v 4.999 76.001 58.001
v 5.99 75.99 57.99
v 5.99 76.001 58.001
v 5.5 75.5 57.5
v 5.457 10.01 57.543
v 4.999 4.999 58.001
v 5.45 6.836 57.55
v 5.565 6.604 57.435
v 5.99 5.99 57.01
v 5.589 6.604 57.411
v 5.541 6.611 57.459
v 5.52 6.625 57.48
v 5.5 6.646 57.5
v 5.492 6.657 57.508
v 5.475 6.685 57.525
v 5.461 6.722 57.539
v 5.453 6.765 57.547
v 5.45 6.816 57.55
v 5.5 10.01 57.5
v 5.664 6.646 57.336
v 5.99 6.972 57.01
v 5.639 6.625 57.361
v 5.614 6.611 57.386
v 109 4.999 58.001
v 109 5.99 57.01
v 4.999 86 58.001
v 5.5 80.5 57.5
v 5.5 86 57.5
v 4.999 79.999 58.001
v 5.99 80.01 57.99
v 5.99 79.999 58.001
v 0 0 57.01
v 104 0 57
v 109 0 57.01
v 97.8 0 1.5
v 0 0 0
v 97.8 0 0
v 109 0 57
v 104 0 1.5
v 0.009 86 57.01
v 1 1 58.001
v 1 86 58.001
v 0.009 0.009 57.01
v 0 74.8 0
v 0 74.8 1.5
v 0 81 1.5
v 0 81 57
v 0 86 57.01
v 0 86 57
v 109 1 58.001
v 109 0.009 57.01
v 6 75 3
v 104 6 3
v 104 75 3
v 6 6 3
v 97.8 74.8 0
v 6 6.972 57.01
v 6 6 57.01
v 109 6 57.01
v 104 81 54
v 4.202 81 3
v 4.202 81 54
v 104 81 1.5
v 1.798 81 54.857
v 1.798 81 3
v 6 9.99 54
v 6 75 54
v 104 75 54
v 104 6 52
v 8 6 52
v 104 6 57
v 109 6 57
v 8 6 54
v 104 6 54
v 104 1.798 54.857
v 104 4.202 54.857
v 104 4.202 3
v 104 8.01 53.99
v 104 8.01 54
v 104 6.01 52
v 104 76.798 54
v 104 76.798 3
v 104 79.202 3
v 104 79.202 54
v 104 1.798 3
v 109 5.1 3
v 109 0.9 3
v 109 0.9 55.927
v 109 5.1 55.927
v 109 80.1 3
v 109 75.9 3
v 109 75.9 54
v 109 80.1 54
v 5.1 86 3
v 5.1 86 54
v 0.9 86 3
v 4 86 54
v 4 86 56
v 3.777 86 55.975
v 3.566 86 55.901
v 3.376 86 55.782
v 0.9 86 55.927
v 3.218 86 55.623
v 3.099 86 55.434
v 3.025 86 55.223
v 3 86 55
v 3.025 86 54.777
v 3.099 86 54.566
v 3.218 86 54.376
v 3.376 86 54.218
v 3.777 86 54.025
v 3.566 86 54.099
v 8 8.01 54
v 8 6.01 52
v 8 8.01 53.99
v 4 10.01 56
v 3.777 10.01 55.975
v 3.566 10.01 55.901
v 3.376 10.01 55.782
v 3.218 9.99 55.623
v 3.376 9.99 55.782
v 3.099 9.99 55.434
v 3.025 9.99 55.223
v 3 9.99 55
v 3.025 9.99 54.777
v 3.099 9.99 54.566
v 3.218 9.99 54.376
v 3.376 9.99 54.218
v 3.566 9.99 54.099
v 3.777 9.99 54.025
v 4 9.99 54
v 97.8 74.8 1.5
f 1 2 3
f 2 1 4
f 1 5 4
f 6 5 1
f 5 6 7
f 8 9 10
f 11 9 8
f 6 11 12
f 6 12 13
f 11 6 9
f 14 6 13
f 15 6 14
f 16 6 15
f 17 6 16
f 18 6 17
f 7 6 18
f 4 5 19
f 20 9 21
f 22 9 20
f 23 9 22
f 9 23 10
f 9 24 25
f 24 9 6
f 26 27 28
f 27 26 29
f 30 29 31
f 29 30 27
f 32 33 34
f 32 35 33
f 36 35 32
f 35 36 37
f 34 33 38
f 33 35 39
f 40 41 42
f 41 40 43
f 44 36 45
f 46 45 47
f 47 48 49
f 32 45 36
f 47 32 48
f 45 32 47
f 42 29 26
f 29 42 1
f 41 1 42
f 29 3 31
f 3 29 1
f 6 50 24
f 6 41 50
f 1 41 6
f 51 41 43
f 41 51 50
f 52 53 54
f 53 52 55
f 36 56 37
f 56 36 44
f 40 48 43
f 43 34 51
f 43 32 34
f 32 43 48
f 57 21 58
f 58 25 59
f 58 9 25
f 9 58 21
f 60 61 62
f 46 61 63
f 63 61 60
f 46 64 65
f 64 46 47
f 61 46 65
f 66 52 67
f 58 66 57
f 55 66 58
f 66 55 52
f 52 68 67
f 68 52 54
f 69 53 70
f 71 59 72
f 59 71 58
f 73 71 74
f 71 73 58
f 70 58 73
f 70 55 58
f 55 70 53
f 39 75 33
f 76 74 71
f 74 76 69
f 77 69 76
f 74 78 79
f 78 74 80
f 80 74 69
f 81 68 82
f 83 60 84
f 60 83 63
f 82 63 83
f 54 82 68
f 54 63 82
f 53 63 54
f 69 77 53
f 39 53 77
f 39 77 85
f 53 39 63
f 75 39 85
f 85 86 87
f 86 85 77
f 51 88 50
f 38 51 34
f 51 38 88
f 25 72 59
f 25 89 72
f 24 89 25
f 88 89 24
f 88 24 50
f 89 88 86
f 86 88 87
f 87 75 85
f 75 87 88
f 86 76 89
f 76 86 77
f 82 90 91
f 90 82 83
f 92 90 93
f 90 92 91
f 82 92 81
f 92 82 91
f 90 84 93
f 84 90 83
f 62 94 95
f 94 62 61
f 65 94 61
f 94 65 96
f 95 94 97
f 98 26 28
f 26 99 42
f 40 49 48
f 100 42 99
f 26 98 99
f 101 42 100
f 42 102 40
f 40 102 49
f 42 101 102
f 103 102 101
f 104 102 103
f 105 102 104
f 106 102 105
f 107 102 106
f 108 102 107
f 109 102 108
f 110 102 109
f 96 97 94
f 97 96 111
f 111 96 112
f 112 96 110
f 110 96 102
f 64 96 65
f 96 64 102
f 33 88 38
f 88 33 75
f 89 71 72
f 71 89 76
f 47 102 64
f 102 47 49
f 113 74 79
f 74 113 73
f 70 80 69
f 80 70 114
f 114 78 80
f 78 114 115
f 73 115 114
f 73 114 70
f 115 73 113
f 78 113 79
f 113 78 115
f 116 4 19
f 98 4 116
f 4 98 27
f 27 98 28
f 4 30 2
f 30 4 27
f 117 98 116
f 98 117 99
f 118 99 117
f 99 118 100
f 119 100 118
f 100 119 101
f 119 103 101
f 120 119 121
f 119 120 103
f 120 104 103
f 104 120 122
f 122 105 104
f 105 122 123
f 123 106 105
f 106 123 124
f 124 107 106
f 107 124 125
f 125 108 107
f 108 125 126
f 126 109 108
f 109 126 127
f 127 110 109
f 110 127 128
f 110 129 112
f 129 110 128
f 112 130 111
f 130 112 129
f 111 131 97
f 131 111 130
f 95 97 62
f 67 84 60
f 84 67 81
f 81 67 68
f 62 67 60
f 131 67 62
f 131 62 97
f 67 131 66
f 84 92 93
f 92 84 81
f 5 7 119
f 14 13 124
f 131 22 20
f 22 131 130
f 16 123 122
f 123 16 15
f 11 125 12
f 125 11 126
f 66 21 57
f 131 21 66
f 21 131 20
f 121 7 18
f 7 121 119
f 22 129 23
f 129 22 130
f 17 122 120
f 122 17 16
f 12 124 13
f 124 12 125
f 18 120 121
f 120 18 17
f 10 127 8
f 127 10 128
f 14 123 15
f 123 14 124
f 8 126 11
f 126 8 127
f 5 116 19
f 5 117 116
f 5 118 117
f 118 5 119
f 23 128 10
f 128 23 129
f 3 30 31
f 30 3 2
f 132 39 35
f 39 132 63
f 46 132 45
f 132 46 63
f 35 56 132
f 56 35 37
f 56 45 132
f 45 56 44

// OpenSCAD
// ============================================================================
// cutlery_box.scad
// Graduated 3-chamber disposable-cutlery box (Option 3) — CUT-FROM-SOLID port
// of build_box.py, for a 120 x 120 x 120 mm printer (AOSEED).
//
// WHY THIS PORT EXISTS (the whole point):
//   The hand-mesh generator (build_box.py) could not keep the 1 mm rim chamfer
//   continuous across the female dovetail joints, because where a slot's flared
//   corner crosses the sloped chamfer it needs a true boolean intersection.
//   OpenSCAD HAS that boolean kernel, so here we do exactly the "cut-from-solid"
//   thing:
//      1. Build the ENTIRE box as ONE solid, WITH the chamfer already on it.
//      2. difference() out vertical dovetail prisms ( /_\ cross-section ),
//         running from just above the base plate up THROUGH the rim, to both
//         (a) form the sliding-dovetail joints, and
//         (b) split the box into 6 bed-sized pieces.
//   Because the cut is a real boolean through the already-chamfered solid, the
//   sloped chamfer<->slot edge is produced for free => the rim chamfer stays
//   CONTINUOUS across every joint, with none of the sliver hacks.
//
// ----------------------------------------------------------------------------
// HOW TO USE
//   In the app:  set `part` below (or use the Customizer dropdown), F5 to
//                preview, F6 to render, then File > Export > STL.
//   One piece (CLI):
//      openscad -o body_knife_A.stl -D 'part="knife_A"' cutlery_box.scad
//   ALL SIX (bash, run from this folder):
//      for p in knife_A knife_B fork_A fork_B spoon_A spoon_B; do \
//        openscad -o "body_$p.stl" -D "part=\"$p\"" cutlery_box.scad ; done
//   PNG preview of one piece:
//      openscad -o knife_B.png --imgsize=1400,1000 --autocenter --viewall \
//        -D 'part="knife_B"' cutlery_box.scad
//
//   Pieces are modelled in ASSEMBLED coordinates (floor-down, z=0 is the bed),
//   so importing all six STLs together shows the assembled box directly; your
//   slicer will auto-drop each one onto the plate for printing.
//
// BED SANITY: every piece is <= 120 mm in X, Y, Z.
//   Z = 58 mm. Widest piece = spoon at 117 mm (Y). A-halves reach 109 mm (X,
//   including the protruding dovetail key). All under 120.
//
// !! I could NOT run OpenSCAD to verify this file (no binary in my sandbox) !!
//   - The rim chamfer is a SMOOTH, true-45 bevel built from hull() frustums of
//     convex rectangles. Works in every OpenSCAD since ~2015 (incl. Homebrew
//     2021.01). No stepped staircase -- and, crucially, it makes box() a clean
//     well-formed solid so the per-part booleans resolve reliably (the old
//     14-slice staircase was fragile and CGAL was dropping the walls of the
//     interior parts, leaving only the key prisms => "floating boxes").
//   - roof() is still available behind USE_ROOF=true for those who have it
//     (2021.01+ snapshots); for THIS rectangular design it is identical, so it
//     is NOT required.
//   - After F6, check the console for "WARNING"/"not a valid 2-manifold".
//     If a tenon ever looks detached, bump EPS to 0.05.
// ============================================================================


/* [Part to render / export] */
part = "knife_A"; // [knife_A, knife_B, fork_A, fork_B, spoon_A, spoon_B, assembly]

/* [Chamfer method] */
// false = smooth hull() frustum bevel (default, any OpenSCAD); true = roof() (2021.01+)
USE_ROOF = false;

/* [Heights (mm)] */
BASE   = 3.0;     // floor / base-plate thickness
COMP_H = 55.0;    // interior wall height above the floor (cutlery stack depth)

/* [Walls (mm)] */
HOST_T   = 6.0;     // thickness of every wall (thick enough to host a dovetail)
HALF_LEN = 104.0;   // printed length of each half (A = near, B = far); <120 incl. key

/* [Chamber bays (mm)] */
N_COL     = 3;       // columns of cutlery per chamber
KNIFE_COL = 23.0;    // -> knife bay 69  (3 x 19 mm knives + play)
FORK_COL  = 33.0;    // -> fork  bay 99  (3 x 29 mm forks  + play)
SPOON_COL = 37.0;    // -> spoon bay 111 (3 x 34 mm spoons + play, trimmed <120)

/* [Dovetail joint (mm)] */
DT_DEPTH = 5.0;   // tail protrusion past the seam (male key depth)
DT_NECK  = 1.2;   // half-width at the seam face (narrow)
DT_FLARE = 2.1;   // half-width at the tip (wide -> locks)
DT_CLR   = 0.4;   // FLANK/seam slide clearance added to the female socket (do not change for fit)
DT_DEPTH_RELIEF = 0.3; // extra depth on the socket BACK only, so the tail tip never bottoms out

/* [Hidden-dovetail top cap / "hat" (mm)] */
// The dovetail otherwise shows its trapezoid outline on the TOP edge of the wall.
// To hide it, the MALE piece extends the wall's full-width top (chamfer included)
// across the key footprint -> a flush, continuous top. The FEMALE piece gets a
// matching top RECESS (cap footprint + CAP_CLR) so the cap drops straight in.
// Result: the top reads as one surface with a single straight seam line at the cap
// tip; the dovetail joinery lives entirely below the cap.
//
// SELF-SUPPORTING UNDERSIDE: the cap reaches the FULL wall width at the chamfer base
// (so the top edge reads as the wall extended, with NO recessed sliver on the outer
// face), and its underside is ONE planar ramp from the chamfer's OUTER CORNER
// (half-width HOST_T/2 at z = BODY_H-CHAMFER) down to the dovetail-neck half-width
// (CAP_FOOT) at CAP_SLANT_DEG from horizontal. No little horizontal step. The ramp
// reaching full width exactly at the chamfer base means "ramp top" == "chamfer base"
// (CAP_H is DERIVED). The FEMALE recess is the same ramp + CAP_CLR play.
// TRADEOFF: because the cap runs all the way to the outer corner, the female wall
// tapers to ~0 at z = BODY_H-CHAMFER -> a thin feather edge at the joint (gradual at
// CAP_SLANT_DEG, hidden inside the joint when assembled). Accepted per design intent.
CAP_SLANT_DEG = 50;     // cap underside ramp angle from horizontal (50 = self-supporting, long flare)
CAP_FOOT = DT_NECK;     // cap-underside half-width where it meets the dovetail neck
CAP_CLR = 0.3;          // slide clearance so the male cap seats into the female top recess

/* [Rim chamfer (mm)] */
CHAMFER = 1.0;    // 45-deg comfort break broken along the top wall edges

/* [Base half-lap / anti-warp (mm)] */
// Neighbouring base plates overlap as a HORIZONTAL half-lap (shiplap) at mid-base
// height, so corners stay coplanar (no lift/protrusion). Horizontal lap faces do
// NOT bind the vertical-drop assembly. Shingle direction: A->B and knife->fork->spoon.
LAP_LEN = 6;        // overlap past the A/B seam and the knife/fork seam
LAP_LEN_FS = 2;     // overlap past the fork/SPOON seam -- SMALLER: spoon is the
                    // tightest piece (117mm of the 120mm bed); a 6mm lap there
                    // would push spoon to 123mm. 2mm keeps spoon at 119mm.
LAP_Z   = BASE/2;   // 1.5 -- horizontal split height of the lap (bottom vs top half)
LAP_CLR = 0.2;      // in-plane clearance so the shelf isn't a press fit

/* [Lid — box features that receive a flat ORDERED clear sheet] */
// The lid itself is NOT printed: it's a flat ~2 mm PETG/Tritan sheet, bullnose-polished
// edges (r=LID_EDGE_R), ordered to size. We only model the box features that receive it.
LID_T            = 2.0;   // ordered sheet thickness
LID_EDGE_R       = 1.0;   // ordered sheet bullnose edge radius (for the sheet order spec)
LID_PLAY         = 0.4;   // total vertical play in the hinge groove (sheet + this)
LID_RECESS       = 2.0;   // lid TOP sits this far BELOW the rim, so the journal pocket is fully
                          // capped (rim caps the bullnose -> retains the lid when raised; tilt-in)
HINGE_AT_MINUS_X = true;  // hinge on the -x (303mm) end wall; clip on +x. (flip = mirror; default delivered)
// perimeter support ledge (lid underside rests on it at z = BODY_H-LID_T)
LEDGE_W          = 2.0;   // ledge inward protrusion (its underside ramps back at 45 deg -> self-supporting)
GROOVE_END_INSET = 0.0;   // groove reaches the corners but RUNS OUT smoothly there (no end-face / no
                          // exposed bore); GROOVE_TAPER sets the run-out length
GROOVE_TAPER     = 4.0;   // y-length over which the eased mouth tapers out at each groove end
// hinge journal (cut into the inner face of the hinge end wall, CONTINUOUS along the long edge)
GROOVE_DEPTH     = 3.0;   // 2mm lead-in slot + 1mm pocket radius -> journal sits 2mm back from the
                          // face so its cap clears the swing relief and RETAINS the lid
GROOVE_POCKET_R  = 1.0;   // journal half-cylinder radius (the bullnose sheet edge rolls in it)
// clip latch (one localized retainer, centered on the clip end wall)
CLIP_W           = 18.0;  // clip width
CLIP_LIP         = 0.4;   // retaining overhang (0.3 light .. 0.6 firm)
CLIP_RAMP_H      = 1.6;   // cam-ramp height above the rim (press-to-close)
// finger scallop (semicircular dish in the rim, centered on & aligned with the clip)
SCALLOP_W        = 16.0;  // scallop width
SCALLOP_DEPTH    = 6.0;   // how far it dishes down from the rim


/* [Hidden] */
EPS      = 0.01;          // tiny overlap so abutting solids fuse cleanly in CGAL
// Upper-chamber pieces (fork, spoon) were cut by a cell plane laid EXACTLY on the
// divider wall's far face (the lower chamber owns that wall). intersection() along a
// plane coincident with an existing box face makes CGAL leave a ZERO-THICKNESS copy
// of the wall face -> edge-manifold + "watertight" but degenerate (OpenSCAD shows it
// as a blue back-face; Tinkercad thickens it into a phantom block). SEAM_EPS nudges
// those cut planes a hair INTO the open bay so they no longer coincide with any box
// face -> no flap. 0.02 mm is physically nothing but is well clear of CGAL's tolerance.
SEAM_EPS = 0.02;
CUT_OVER = 1.0;           // how far dovetail cutters overshoot the rim (clean cut)

BODY_H    = BASE + COMP_H;     // 58  total height
END_WALL  = HOST_T;            // end walls are dovetail hosts too -> equally thick
TOTAL_LEN = 2 * HALF_LEN;      // 208 assembled length (end wall .. end wall)

// hidden-cap ramp geometry (derived).
//   CAP_HW    = cap MAX half-width = HOST_T/2 (the full wall edge) at the chamfer base.
//   CAP_RISE  = vertical height of the self-supporting CAP_SLANT_DEG underside ramp.
//   CAP_ZRAMP = where the cap reaches full width = the chamfer base (BODY_H-CHAMFER), so
//               the ramp runs straight to the chamfer OUTER CORNER (no horizontal step).
//   CAP_ZBOT  = cap bottom = ramp start; CAP_H derived from it (for reference/report).
//   CAP_ZRAMP_R = recess ramp top, shifted down by CAP_CLR so the recess ramp stays
//               parallel to the cap ramp with uniform play.
CAP_HW      = HOST_T/2;   // cap reaches the FULL wall edge at the chamfer base
CAP_RISE    = (CAP_HW - CAP_FOOT) * tan(CAP_SLANT_DEG);
CAP_ZRAMP   = BODY_H - CHAMFER;               // full width exactly at the chamfer base / outer corner
CAP_ZBOT    = CAP_ZRAMP - CAP_RISE;
CAP_H       = BODY_H - CAP_ZBOT;              // derived; reported
CAP_ZRAMP_R = CAP_ZRAMP;   // recess ramp ALSO tops at the chamfer corner (mirror the cap) -> no vertical lip
// sanity checks
assert(CAP_ZBOT > BASE + 1,
       "cap zone dips too low -- raise CAP_SLANT_DEG");
assert(CAP_HW >= DT_FLARE,
       "cap too narrow to cover the dovetail tail");

// NOTE: lid-derived constants are defined BELOW the Y-layout block, because some of
// them (INTERIOR_Y0/Y1, CLIP_CY) depend on OUTER_L / OUTER_R / EXT_W. See "lid derived".

// bay widths
KNIFE_BAY = N_COL * KNIFE_COL; // 69
FORK_BAY  = N_COL * FORK_COL;  // 99
SPOON_BAY = N_COL * SPOON_COL; // 111

// ---- Y layout (width direction): wall | bay | divider | bay | divider | bay | wall
KNIFE_Y0 = 0;
KNIFE_Y1 = HOST_T + KNIFE_BAY + HOST_T;        // 0..81   (outer wall + bay + divider)
FORK_Y0  = KNIFE_Y1;                           // 81
FORK_Y1  = FORK_Y0 + FORK_BAY + HOST_T;        // 81..186 (bay + divider)
SPOON_Y0 = FORK_Y1;                            // 186
SPOON_Y1 = SPOON_Y0 + SPOON_BAY + HOST_T;      // 186..303(bay + outer wall)
EXT_W    = SPOON_Y1;                           // 303 total width

// lengthwise wall Y-bands [y0,y1] (host the A/B dovetails) + their centers
OUTER_L  = [0, HOST_T];                                       // [0,6]    c=3
DIV_KF   = [HOST_T + KNIFE_BAY, HOST_T + KNIFE_BAY + HOST_T]; // [75,81]  c=78
DIV_FS   = [FORK_Y0 + FORK_BAY, FORK_Y0 + FORK_BAY + HOST_T]; // [180,186]c=183
OUTER_R  = [SPOON_Y1 - HOST_T, SPOON_Y1];                     // [297,303]c=300

// ---- lid derived ---- (placed AFTER OUTER_L/OUTER_R/EXT_W so nothing is forward-referenced)
LID_TOP_Z   = BODY_H - LID_RECESS;        // 56  lid TOP (recessed); rim z=58 rises LID_RECESS above it
LID_Z_UNDER = LID_TOP_Z - LID_T;          // 54  lid underside / ledge top / lowered-divider top
POCKET_CZ   = LID_TOP_Z - LID_T/2;        // 55  journal centre (lid mid) -> pocket top = LID_TOP_Z = capped
// hinge end-wall inner face x + inward direction; clip end-wall inner face x + inward dir
HINGE_INX   = HINGE_AT_MINUS_X ? END_WALL : TOTAL_LEN - END_WALL;       // 6  (default)
HINGE_IN    = HINGE_AT_MINUS_X ? 1 : -1;  // interior direction from the hinge wall (+x default)
CLIP_INX    = HINGE_AT_MINUS_X ? TOTAL_LEN - END_WALL : END_WALL;       // 202 (default)
CLIP_IN     = HINGE_AT_MINUS_X ? -1 : 1;  // interior direction from the clip wall (-x default)
POCKET_CX   = HINGE_INX - HINGE_IN*(GROOVE_DEPTH - GROOVE_POCKET_R);    // 5  pocket centre x (INTO the wall)
INTERIOR_Y0 = OUTER_L[1];                 // 6   inner face of the -y short wall
INTERIOR_Y1 = OUTER_R[0];                 // 297 inner face of the +y short wall
CLIP_CY     = EXT_W/2;                     // 151.5 clip/scallop centre (in the fork chamber)
assert(POCKET_CZ - GROOVE_POCKET_R > BASE + 1,
       "journal dips too low -- reduce LID_RECESS or LID_T");
assert(POCKET_CZ + GROOVE_POCKET_R <= LID_TOP_Z + EPS,
       "journal not capped -- lower the lid (raise LID_RECESS) or shrink GROOVE_POCKET_R");
// NOTE: with LID_RECESS the lid underside (and lowered dividers) sit BELOW CAP_ZBOT. That is
// intended: the inner dividers are cut flat below the cap zone (their hidden caps are removed,
// but the lid covers them); the perimeter/end-wall caps are untouched (full-height walls).

// the three OPEN bays are rectangular holes in the wall footprint:
//   footprint = outer rectangle MINUS these bays  (== the 6 walls; verified).
// The smooth chamfer is built from exactly this decomposition.
BAY_X0 = END_WALL;              // 6
BAY_X1 = TOTAL_LEN - END_WALL;  // 202
BAYS = [
    [BAY_X0, BAY_X1, HOST_T,   HOST_T + KNIFE_BAY],   // knife bay [6,202] x [6,75]
    [BAY_X0, BAY_X1, FORK_Y0,  FORK_Y0 + FORK_BAY],   // fork  bay [6,202] x [81,180]
    [BAY_X0, BAY_X1, SPOON_Y0, SPOON_Y0 + SPOON_BAY], // spoon bay [6,202] x [186,297]
];

YC_OUTL  = OUTER_L[0] + HOST_T/2;   // 3   outer-left wall center
YC_DIVKF = DIV_KF[0]  + HOST_T/2;   // 78  knife/fork divider center
YC_DIVFS = DIV_FS[0]  + HOST_T/2;   // 183 fork/spoon divider center
YC_OUTR  = OUTER_R[0] + HOST_T/2;   // 300 outer-right wall center

// seams
AB_SEAM = HALF_LEN;               // 104  A/B length seam (x)
SEAM_KF = FORK_Y0;                // 81   knife/fork width seam (y)
SEAM_FS = SPOON_Y0;              // 186  fork/spoon width seam (y)
ENDC_A  = END_WALL/2;             // 3    A end-wall center (x) -> chamber dovetails
ENDC_B  = TOTAL_LEN - END_WALL/2; // 205  B end-wall center (x)


// ============================================================================
// 2D wall footprint (cross-section of all walls, constant in z for the straight
// part). Union of: 2 full-width end walls + 4 lengthwise walls between them.
// ============================================================================
module wall_footprint_2d() {
    // footprint = outer rectangle minus the 3 open bays  (== the 6 walls)
    difference() {
        square([TOTAL_LEN, EXT_W]);
        for (b = BAYS) translate([b[0], b[2]]) square([b[1] - b[0], b[3] - b[2]]);
    }
}

// ============================================================================
// The full chamfered box solid = base plate + walls with a continuous 1 mm
// top-rim chamfer. Built ONCE; every piece is carved out of this.
// ============================================================================
module chamfer_cap() {
    // SMOOTH 45 rim chamfer over z[BODY_H-CHAMFER, BODY_H], in absolute coords.
    zm = BODY_H - CHAMFER;
    if (USE_ROOF) {
        // exact straight-skeleton roof, capped at CHAMFER height (needs roof()).
        intersection() {
            translate([0,0,zm]) roof() wall_footprint_2d();
            translate([0,0,zm]) linear_extrude(CHAMFER + EPS) wall_footprint_2d();
        }
    } else {
        // DEFAULT: true 45 bevel as hull() frustums of CONVEX rectangles -> smooth
        // AND a clean manifold.  Since footprint = outer - bays, the chamfer of the
        // footprint = (outer rectangle beveled inward) MINUS (each bay beveled so it
        // grows toward the top, which bevels every bay-facing rim).  All hull()s are
        // on convex rectangles, so nothing gets convex-filled.
        difference() {
            // outer perimeter frustum: full outer rect at zm -> inset by CHAMFER at top
            hull() {
                translate([0,0,zm])     linear_extrude(0.001) square([TOTAL_LEN, EXT_W]);
                translate([0,0,BODY_H]) linear_extrude(0.001) offset(delta=-CHAMFER) square([TOTAL_LEN, EXT_W]);
            }
            // each bay grows by CHAMFER toward the top -> bevels its surrounding rim.
            // (overshoots z a hair past both ends so the cut is clean.)
            for (b = BAYS)
                hull() {
                    translate([0,0,zm-EPS])     linear_extrude(0.001)
                        translate([b[0],b[2]]) offset(delta=-EPS)        square([b[1]-b[0], b[3]-b[2]]);
                    translate([0,0,BODY_H+EPS]) linear_extrude(0.001)
                        translate([b[0],b[2]]) offset(delta=CHAMFER+EPS) square([b[1]-b[0], b[3]-b[2]]);
                }
        }
    }
}

module box() {
    zm = BODY_H - CHAMFER;
    union() {
        cube([TOTAL_LEN, EXT_W, BASE]);                                        // base plate z[0,3]
        translate([0,0,BASE]) linear_extrude(zm - BASE + EPS) wall_footprint_2d(); // straight walls z[3,57]
        chamfer_cap();                                                         // smooth chamfer z[57,58]
    }
}

// ============================================================================
// Dovetail prisms ( /_\ ). Vertical, z[BASE, BODY_H+CUT_OVER] so they cut
// through the rim but leave the base plate continuous. The near face is pushed
// back EPS so a male key always fuses to its wall.
//   male key   : half_n=DT_NECK,         half_f=DT_FLARE
//   female slot: half_n=DT_NECK+DT_CLR,  half_f=DT_FLARE+DT_CLR
// ============================================================================
module dt_prism_X(seam_x, yc, half_n, half_f) {   // perpendicular to X, grows +X
    translate([0,0,BASE]) linear_extrude(BODY_H - BASE + CUT_OVER)
        polygon([[seam_x - EPS,        yc - half_n],
                 [seam_x + DT_DEPTH,   yc - half_f],
                 [seam_x + DT_DEPTH,   yc + half_f],
                 [seam_x - EPS,        yc + half_n]]);
}
module dt_prism_Y(seam_y, xc, half_n, half_f) {   // perpendicular to Y, grows +Y
    translate([0,0,BASE]) linear_extrude(BODY_H - BASE + CUT_OVER)
        polygon([[xc - half_n, seam_y - EPS],
                 [xc - half_f, seam_y + DT_DEPTH],
                 [xc + half_f, seam_y + DT_DEPTH],
                 [xc + half_n, seam_y - EPS]]);
}
module ab_key   (yc)        { dt_prism_X(AB_SEAM, yc, DT_NECK, DT_FLARE); }
module ch_key   (seam_y, xc){ dt_prism_Y(seam_y, xc, DT_NECK, DT_FLARE); }

// Female sockets = male + DT_CLR on the flanks/seam (unchanged), PLUS a straight
// back-face relief of DT_DEPTH_RELIEF so the tail tip never bottoms out. The
// relief is a rectangle tacked onto the trapezoid's tip at the SAME flare width,
// so the angled flank faces (and their 0.4 mm slide clearance) are untouched.
module ab_socket(yc) {
    dt_prism_X(AB_SEAM, yc, DT_NECK + DT_CLR, DT_FLARE + DT_CLR);
    translate([0,0,BASE]) linear_extrude(BODY_H - BASE + CUT_OVER)
        translate([AB_SEAM + DT_DEPTH, yc - (DT_FLARE + DT_CLR)])
            square([DT_DEPTH_RELIEF, 2*(DT_FLARE + DT_CLR)]);          // back relief, +X
}
module ch_socket(seam_y, xc) {
    dt_prism_Y(seam_y, xc, DT_NECK + DT_CLR, DT_FLARE + DT_CLR);
    translate([0,0,BASE]) linear_extrude(BODY_H - BASE + CUT_OVER)
        translate([xc - (DT_FLARE + DT_CLR), seam_y + DT_DEPTH])
            square([2*(DT_FLARE + DT_CLR), DT_DEPTH_RELIEF]);          // back relief, +Y
}

// ===== hidden-dovetail top cap ("hat"), SELF-SUPPORTING underside ===============
// MALE cap: a FULL-wall-width hat whose underside is ONE planar ramp from the chamfer's
// OUTER CORNER (half-width CAP_HW = HOST_T/2 at CAP_ZRAMP = BODY_H-CHAMFER) down to the
// dovetail-neck half-width (CAP_FOOT) at CAP_SLANT_DEG from horizontal -> the self-
// supporting shoulder, running straight to the corner (no horizontal step). Built as
// hull(narrow bottom slab buried in the tail neck, full-width top slab through the rim);
// box() trims it to the wall and adds the continuous rim chamfer for free, so the outer
// top edge reads as the wall extended (no recessed sliver). The protruding NOSE is left
// SQUARE (vertical) -- hidden in the female socket when assembled.
// TRADEOFF: the female wall tapers to ~0 at z=BODY_H-CHAMFER (a thin feather edge at the
// joint, gradual at CAP_SLANT_DEG) -- accepted per design intent.
module ab_cap(yc) {   // A/B seam, grows +X past the seam (length direction)
    hull() {
        translate([AB_SEAM - EPS, yc - CAP_FOOT, CAP_ZBOT])
            cube([DT_DEPTH + EPS, 2*CAP_FOOT, EPS]);
        translate([AB_SEAM - EPS, yc - CAP_HW,   CAP_ZRAMP])
            cube([DT_DEPTH + EPS, 2*CAP_HW, (BODY_H + CUT_OVER) - CAP_ZRAMP]);
    }
}
module ch_cap(seam_y, xc) {   // chamber seam, grows +Y past the seam (in the end wall)
    hull() {
        translate([xc - CAP_FOOT, seam_y - EPS, CAP_ZBOT])
            cube([2*CAP_FOOT, DT_DEPTH + EPS, EPS]);
        translate([xc - CAP_HW,   seam_y - EPS, CAP_ZRAMP])
            cube([2*CAP_HW, DT_DEPTH + EPS, (BODY_H + CUT_OVER) - CAP_ZRAMP]);
    }
}
// FEMALE recess: the SAME ramp grown by CAP_CLR (flanks, tip, floor, and ramp shifted down
// by CAP_CLR so it stays parallel) -> the cap seats with uniform slide clearance. It opens
// to the wall edge (and a hair past, into air) so the cap's full-width corner drops in;
// this is what leaves the thin female feather at the top (accepted). Open upward + toward seam.
module ab_cap_neg(yc) {
    hull() {
        translate([AB_SEAM - EPS, yc - (CAP_FOOT + CAP_CLR), CAP_ZBOT - CAP_CLR])
            cube([DT_DEPTH + CAP_CLR + EPS, 2*(CAP_FOOT + CAP_CLR), EPS]);
        translate([AB_SEAM - EPS, yc - (CAP_HW + EPS), CAP_ZRAMP_R])
            cube([DT_DEPTH + CAP_CLR + EPS, 2*(CAP_HW + EPS), (BODY_H + CUT_OVER + 1) - CAP_ZRAMP_R]);
    }
}
module ch_cap_neg(seam_y, xc) {
    hull() {
        translate([xc - (CAP_FOOT + CAP_CLR), seam_y - EPS, CAP_ZBOT - CAP_CLR])
            cube([2*(CAP_FOOT + CAP_CLR), DT_DEPTH + CAP_CLR + EPS, EPS]);
        translate([xc - (CAP_HW + EPS), seam_y - EPS, CAP_ZRAMP_R])
            cube([2*(CAP_HW + EPS), DT_DEPTH + CAP_CLR + EPS, (BODY_H + CUT_OVER + 1) - CAP_ZRAMP_R]);
    }
}

// rectangular cell (x[xa,xb], y[ya,yb], full height + margin) used to split pieces
module cell(xa, xb, ya, yb) {
    translate([xa, ya, -1]) cube([xb - xa, yb - ya, BODY_H + 11]);
}

// ===== base half-lap (shiplap) =================================================
// HORIZONTAL lap at mid-base height: the shelf-owner keeps its BOTTOM half
// (z 0..LAP_Z) extending LAP_LEN past the seam; the neighbour has its bottom half
// REMOVED there (keeps only the top half) and lands flat on the shelf. Horizontal
// faces => no binding during the vertical drop. Shelves live entirely in the base
// (z < BASE), well clear of the wall dovetails (z >= BASE).
// Shingle = FEMALE-first (matches the no-notch dovetail assembly order, which
// lowers the male piece onto the female): the B half owns the A/B shelf (grows
// -X into A) and the UPPER chamber (fork, spoon) owns the chamber shelf (grows
// -Y into the lower chamber).  Order: spoon, fork, knife; B before A.
module lap_shelf_X(y0, y1) {                 // B-side shelf, grows -X into A past AB_SEAM
    // +EPS past AB_SEAM so the shelf interpenetrates (not just abuts) its own B body -> fuses cleanly.
    translate([AB_SEAM - LAP_LEN, y0, 0]) cube([LAP_LEN + EPS, y1 - y0, LAP_Z]);
}
module lap_neg_X(y0, y1) {                   // A-side: remove bottom half to receive it
    translate([AB_SEAM - LAP_LEN - LAP_CLR, y0 - EPS, -EPS])
        cube([LAP_LEN + LAP_CLR + EPS, (y1 - y0) + 2*EPS, LAP_Z + EPS]);
}
module lap_shelf_Y(seam_y, x0, x1, ln=LAP_LEN) {   // upper-chamber shelf, grows -Y into lower
    // grows -Y by `ln` into the lower chamber AND +Y by 2*SEAM_EPS past the seam so it
    // always overlaps the (SEAM_EPS-nudged) body floor and stays fused -> no floating shelf.
    translate([x0, seam_y - ln, 0]) cube([x1 - x0, ln + 2*SEAM_EPS, LAP_Z]);
}
module lap_neg_Y(seam_y, x0, x1, ln=LAP_LEN) {     // lower-chamber: remove bottom half
    translate([x0 - EPS, seam_y - ln - LAP_CLR, -EPS])
        cube([(x1 - x0) + 2*EPS, ln + LAP_CLR + EPS, LAP_Z + EPS]);
}

// ============================================================================
// LID FEATURES (receive a flat ORDERED clear sheet; the sheet is not printed).
// All features live at the TOP (z >= ~52), ABOVE the dovetail engagement, the half-lap
// (z<1.5) and most of the hat, so the vertical-drop assembly and joints are untouched.
// EPS overlaps throughout; no coincident coplanar faces with the existing walls.
// Default orientation: HINGE on the -x end wall (A pieces), CLIP on the +x end wall
// (B pieces), clip+scallop centred on the fork (middle) chamber.
// ============================================================================

// --- perimeter support ledge: 45-deg self-supporting brackets; rest face at LID_Z_UNDER.
//     Runs along the CLIP end wall + the two short outer walls. (Hinge wall uses the groove.)
//     Built as hull(thin top edge, wall column) -> a triangular bracket whose underside is
//     a 45-deg ramp (prints floor-down with no support). ADDED to each piece (clipped by cell).
//     Each run is INSET by LEDGE_W from the perpendicular walls so the three brackets never
//     overlap at a corner and the wall's normal chamfer wraps every corner uninterrupted.
module lid_ledge() {
    cy0 = INTERIOR_Y0 + LEDGE_W;  cy1 = INTERIOR_Y1 - LEDGE_W;  cyl = cy1 - cy0;   // clip-run y span (inset)
    sx0 = END_WALL    + LEDGE_W;  sxl = (TOTAL_LEN - 2*END_WALL) - 2*LEDGE_W;       // short-run x span (inset)
    // clip end wall (x = CLIP_INX), bracket protrudes toward interior (CLIP_IN)
    hull() {
        translate([CLIP_INX + CLIP_IN*LEDGE_W, cy0, LID_Z_UNDER - EPS]) cube([EPS, cyl, EPS]);
        translate([CLIP_INX - EPS,             cy0, LID_Z_UNDER - LEDGE_W]) cube([2*EPS, cyl, LEDGE_W]);
    }
    // OUTER_L short wall (y = INTERIOR_Y0), bracket protrudes +y
    hull() {
        translate([sx0, INTERIOR_Y0 + LEDGE_W, LID_Z_UNDER - EPS]) cube([sxl, EPS, EPS]);
        translate([sx0, INTERIOR_Y0 - EPS,     LID_Z_UNDER - LEDGE_W]) cube([sxl, 2*EPS, LEDGE_W]);
    }
    // OUTER_R short wall (y = INTERIOR_Y1), bracket protrudes -y
    hull() {
        translate([sx0, INTERIOR_Y1 - LEDGE_W, LID_Z_UNDER - EPS]) cube([sxl, EPS, EPS]);
        translate([sx0, INTERIOR_Y1 - EPS,     LID_Z_UNDER - LEDGE_W]) cube([sxl, 2*EPS, LEDGE_W]);
    }
}

// --- hinge groove: ONE 2D cross-section (journal bore + lead-in slot + 45-deg swing ramp),
//     CAPPED at the recessed lid top (LID_TOP_Z), swept along the wall. At BOTH ends the whole
//     profile RUNS OUT smoothly -- it tapers to the inner-top rim corner (HINGE_INX, BODY_H) --
//     so there is NO end-face and NO exposed bore at the corners; the groove just fades into the
//     wall. The rim caps the bullnose (retains the lid, tilt-in); the 45-deg ramp is self-
//     supporting and gives the swing clearance; the cap stays full over the bullnose => retains.
module groove_profile() {                            // 2D cross-section in (x, z)
    union() {
        translate([POCKET_CX, POCKET_CZ]) circle(r = GROOVE_POCKET_R, $fn = 28);              // journal bore
        translate([POCKET_CX, LID_Z_UNDER]) square([HINGE_INX - POCKET_CX + EPS, LID_T]);     // lead-in slot
        polygon([[POCKET_CX, LID_TOP_Z], [HINGE_INX + EPS, LID_TOP_Z], [HINGE_INX + EPS, BODY_H + EPS]]); // swing ramp
    }
}
module groove_extrude(y0, y1) {                      // sweep the profile along the wall, y0..y1
    translate([0, y0, 0]) rotate([90,0,0]) translate([0,0,-(y1 - y0)]) linear_extrude(y1 - y0) groove_profile();
}
module groove_runout(yApex, yFull) {                 // groove fades to the inner-top rim corner at yApex
    hull() {
        groove_extrude(yFull - EPS, yFull + EPS);    // thin full-profile slice at yFull
        translate([HINGE_INX - EPS, yApex - EPS, BODY_H - EPS]) cube([2*EPS, 2*EPS, 2*EPS]);  // collapse point
    }
}
module hinge_groove() {
    gy0 = INTERIOR_Y0 + GROOVE_END_INSET;            // 6   (reaches the corner; runs out there)
    gy1 = INTERIOR_Y1 - GROOVE_END_INSET;            // 297
    ro  = min(GROOVE_TAPER, (gy1 - gy0)/2 - EPS);    // run-out length at each end
    groove_extrude(gy0 + ro, gy1 - ro);              // full-depth middle
    groove_runout(gy0, gy0 + ro);                    // -y run-out (fades into the corner)
    groove_runout(gy1, gy1 - ro);                    // +y run-out
}

// --- lower the inner chamber dividers to the lid underside (mid-support, no sag).
//     Removes the divider top over the full length; outer walls keep full height.
module divider_lower() {
    // x-span is the CHAMBER BAY only [BAY_X0, BAY_X1] (+EPS overlap into the end walls so the
    // cut is manifold). The end/outer walls keep their full BODY_H tops; only the two INNER
    // dividers (DIV_KF, DIV_FS) are lowered.
    translate([BAY_X0 - EPS, DIV_KF[0], LID_Z_UNDER]) cube([BAY_X1 - BAY_X0 + 2*EPS, HOST_T, BODY_H - LID_Z_UNDER + CUT_OVER]);
    translate([BAY_X0 - EPS, DIV_FS[0], LID_Z_UNDER]) cube([BAY_X1 - BAY_X0 + 2*EPS, HOST_T, BODY_H - LID_Z_UNDER + CUT_OVER]);
}

// --- retaining clip (ADDED): a lip on the clip end wall, centred on CLIP_CY, that overhangs
//     the RECESSED lid top (LID_TOP_Z) by CLIP_LIP and holds it down. A lead-in ramp above the
//     lip (up to LID_TOP_Z+CLIP_RAMP_H, still below the rim) cams the lid under as it swings
//     closed. Anchored into the wall (x = CLIP_INX-CLIP_IN*HOST_T/2). Added AFTER the scallop
//     cut so the scallop never undercuts it. No longer protrudes above the rim.
module lid_clip() {
    translate([0, CLIP_CY - CLIP_W/2, 0]) rotate([90,0,0]) translate([0,0,-CLIP_W]) linear_extrude(CLIP_W)
        polygon([[CLIP_INX - CLIP_IN*HOST_T/2, LID_TOP_Z - 0.8],         // anchor low, into the wall (fuse)
                 [CLIP_INX + CLIP_IN*CLIP_LIP, LID_TOP_Z],               // lip tip: overhang over the lid top
                 [CLIP_INX + CLIP_IN*CLIP_LIP, LID_TOP_Z + 0.4],         // lip front
                 [CLIP_INX - CLIP_IN*HOST_T/2, LID_TOP_Z + CLIP_RAMP_H]]);// lead-in ramp up into the wall
}

// --- finger scallop (CUT): a semicircular dish in the rim's INNER edge at the clip, so a
//     fingertip reaches under the lid edge to release it. Interior half only (does not
//     touch the wall body or the clip's anchor).
module lid_scallop() {
    intersection() {
        translate([CLIP_INX, CLIP_CY, BODY_H - SCALLOP_DEPTH]) cylinder(h = SCALLOP_DEPTH + EPS, r = SCALLOP_W/2, $fn = 40);
        translate([CLIP_INX + (CLIP_IN<0 ? -SCALLOP_W : 0), CLIP_CY - SCALLOP_W, BODY_H - SCALLOP_DEPTH - EPS])
            cube([SCALLOP_W, 2*SCALLOP_W, SCALLOP_DEPTH + 2*EPS]);
    }
}

// ============================================================================
// The six pieces.  piece = intersection(box, cell + own male keys) - own sockets
//   A halves are MALE on the A/B seam (keep the key); B halves are FEMALE (slot).
//   On a chamber seam the LEFT chamber is male (+Y), the right chamber is female.
// ============================================================================
// Base half-lap shingling (FEMALE-first, Option 1):
//   A/B seam  -> the B half owns the bottom shelf (grows -X), A has the negative.
//   chamber   -> the UPPER chamber (fork, spoon) owns the shelf (grows -Y); the
//                lower chamber (knife, fork) has the negative.
//   Assembly order: spoon, fork, knife; B before A (male lowered onto female).
// Center crossings (104,81)&(104,186): the CHAMBER shelf (fork_A / spoon_A) owns the
//   crossing square; the B-half A/B shelf (knife_B / fork_B) is CLIPPED short of the
//   chamber seam by LAP_LEN so two shelves never collide.
module knife_A() {                                       // placed LAST; receives everything
    difference() {
        union() {
            intersection() {
                box();
                union() {
                    cell(-1, AB_SEAM, KNIFE_Y0 - 1, KNIFE_Y1);
                    ab_key(YC_OUTL); ab_key(YC_DIVKF); ch_key(SEAM_KF, ENDC_A);
                    ab_cap(YC_OUTL); ab_cap(YC_DIVKF); ch_cap(SEAM_KF, ENDC_A);  // hide tops (male)
                }
            }
            intersection() { lid_ledge(); cell(-1, AB_SEAM, KNIFE_Y0 - 1, KNIFE_Y1); }  // lid support ledge
        }
        lap_neg_X(KNIFE_Y0, KNIFE_Y1);            // receive knife_B's A/B shelf
        lap_neg_Y(SEAM_KF, 0, AB_SEAM);           // receive fork_A's chamber shelf
        hinge_groove(); divider_lower(); lid_scallop();   // lid cuts (groove hits A pieces; divider/scallop where present)
    }
}

module knife_B() {
    difference() {
        union() {
            intersection() {
                box();
                union() {
                    cell(AB_SEAM, TOTAL_LEN + 1, KNIFE_Y0 - 1, KNIFE_Y1);
                    ch_key(SEAM_KF, ENDC_B);
                    ch_cap(SEAM_KF, ENDC_B);                // hide top (male, chamber)
                }
            }
            lap_shelf_X(KNIFE_Y0, KNIFE_Y1 - LAP_LEN);  // A/B shelf -> knife_A (CLIPPED at y=81 crossing)
            intersection() { lid_ledge(); cell(AB_SEAM, TOTAL_LEN + 1, KNIFE_Y0 - 1, KNIFE_Y1); }  // lid support ledge
        }
        ab_socket(YC_OUTL); ab_socket(YC_DIVKF);
        ab_cap_neg(YC_OUTL); ab_cap_neg(YC_DIVKF);      // top recesses to receive knife_A's caps (female)
        lap_neg_Y(SEAM_KF, AB_SEAM, TOTAL_LEN);         // receive fork_B's chamber shelf
        hinge_groove(); divider_lower(); lid_scallop();   // lid cuts
    }
}

module fork_A() {
    difference() {
        union() {
            intersection() {
                box();
                union() {
                    cell(-1, AB_SEAM, FORK_Y0 + SEAM_EPS, FORK_Y1);  // -Y cut nudged off the divider face
                    ab_key(YC_DIVFS); ch_key(SEAM_FS, ENDC_A);
                    ab_cap(YC_DIVFS); ch_cap(SEAM_FS, ENDC_A);       // hide tops (male)
                }
            }
            lap_shelf_Y(SEAM_KF, 0, AB_SEAM);           // chamber shelf -> knife_A (owns crossing)
            intersection() { lid_ledge(); cell(-1, AB_SEAM, FORK_Y0 + SEAM_EPS, FORK_Y1); }  // lid support ledge (none in fork-A)
        }
        lap_neg_X(FORK_Y0, FORK_Y1);                    // receive fork_B's A/B shelf
        ch_socket(SEAM_KF, ENDC_A);
        ch_cap_neg(SEAM_KF, ENDC_A);                    // top recess to receive knife_A's chamber cap (female)
        lap_neg_Y(SEAM_FS, 0, AB_SEAM, LAP_LEN_FS);     // receive spoon_A's (small) chamber shelf
        hinge_groove(); divider_lower(); lid_scallop();   // lid cuts (groove = fork-A hinge segment; divider = DIV_FS)
    }
}

module fork_B() {
    union() {
        difference() {
            union() {
                intersection() {
                    box();
                    union() {
                        cell(AB_SEAM, TOTAL_LEN + 1, FORK_Y0 + SEAM_EPS, FORK_Y1);  // -Y cut nudged off the divider face
                        ch_key(SEAM_FS, ENDC_B);
                        ch_cap(SEAM_FS, ENDC_B);                // hide top (male, chamber)
                    }
                }
                lap_shelf_X(FORK_Y0, FORK_Y1 - LAP_LEN_FS); // A/B shelf -> fork_A (CLIPPED at y=186 crossing)
                lap_shelf_Y(SEAM_KF, AB_SEAM, TOTAL_LEN);   // chamber shelf -> knife_B
                intersection() { lid_ledge(); cell(AB_SEAM, TOTAL_LEN + 1, FORK_Y0 + SEAM_EPS, FORK_Y1); }  // lid ledge (clip-end run)
            }
            ab_socket(YC_DIVFS);
            ab_cap_neg(YC_DIVFS);                           // top recess to receive fork_A's A/B cap (female)
            ch_socket(SEAM_KF, ENDC_B);
            ch_cap_neg(SEAM_KF, ENDC_B);                    // top recess to receive knife_B's chamber cap (female)
            lap_neg_Y(SEAM_FS, AB_SEAM, TOTAL_LEN, LAP_LEN_FS); // receive spoon_B's (small) chamber shelf
            hinge_groove(); divider_lower(); lid_scallop();     // lid cuts (scallop lands here)
        }
        intersection() { lid_clip(); cell(AB_SEAM, TOTAL_LEN + 1, FORK_Y0 + SEAM_EPS, FORK_Y1); }  // retaining clip, added AFTER the scallop cut
    }
}

module spoon_A() {
    difference() {
        union() {
            intersection() {
                box();
                union() {
                    cell(-1, AB_SEAM, SPOON_Y0 + SEAM_EPS, SPOON_Y1 + 1);  // -Y cut nudged off the divider face
                    ab_key(YC_OUTR);
                    ab_cap(YC_OUTR);                        // hide top (male)
                }
            }
            lap_shelf_Y(SEAM_FS, 0, AB_SEAM, LAP_LEN_FS); // chamber shelf -> fork_A (small; owns crossing)
            intersection() { lid_ledge(); cell(-1, AB_SEAM, SPOON_Y0 + SEAM_EPS, SPOON_Y1 + 1); }  // lid support ledge (OUTER_R run)
        }
        lap_neg_X(SPOON_Y0, SPOON_Y1);                  // receive spoon_B's A/B shelf
        ch_socket(SEAM_FS, ENDC_A);
        ch_cap_neg(SEAM_FS, ENDC_A);                    // top recess to receive fork_A's chamber cap (female)
        hinge_groove(); divider_lower(); lid_scallop();   // lid cuts (groove = spoon-A hinge segment)
    }
}

module spoon_B() {                                      // placed FIRST; owns shelves
    difference() {
        union() {
            intersection() {
                box();
                union() {
                    cell(AB_SEAM, TOTAL_LEN + 1, SPOON_Y0 + SEAM_EPS, SPOON_Y1 + 1);  // -Y cut nudged off the divider face
                }
            }
            lap_shelf_X(SPOON_Y0, SPOON_Y1);            // A/B shelf -> spoon_A
            lap_shelf_Y(SEAM_FS, AB_SEAM, TOTAL_LEN, LAP_LEN_FS); // chamber shelf -> fork_B (small)
            intersection() { lid_ledge(); cell(AB_SEAM, TOTAL_LEN + 1, SPOON_Y0 + SEAM_EPS, SPOON_Y1 + 1); }  // lid ledge (OUTER_R + clip-end runs)
        }
        ab_socket(YC_OUTR);
        ab_cap_neg(YC_OUTR);                            // top recess to receive spoon_A's A/B cap (female)
        ch_socket(SEAM_FS, ENDC_B);
        ch_cap_neg(SEAM_FS, ENDC_B);                    // top recess to receive fork_B's chamber cap (female)
        hinge_groove(); divider_lower(); lid_scallop();   // lid cuts
    }
}

// Fast preview: the full continuous-chamfer box (no cuts). The six part modules
// above are the real, separable pieces. To instead see the TRUE assembled
// pieces with their joints (slower — 6 booleans), replace box(); below with:
//   knife_A(); knife_B(); fork_A(); fork_B(); spoon_A(); spoon_B();
module assembly() {
    box();
}

// ============================================================================
// Render dispatch
// ============================================================================
if      (part == "knife_A")  knife_A();
else if (part == "knife_B")  knife_B();
else if (part == "fork_A")   fork_A();
else if (part == "fork_B")   fork_B();
else if (part == "spoon_A")  spoon_A();
else if (part == "spoon_B")  spoon_B();
else if (part == "assembly") assembly();
else echo(str("Unknown part: ", part));
